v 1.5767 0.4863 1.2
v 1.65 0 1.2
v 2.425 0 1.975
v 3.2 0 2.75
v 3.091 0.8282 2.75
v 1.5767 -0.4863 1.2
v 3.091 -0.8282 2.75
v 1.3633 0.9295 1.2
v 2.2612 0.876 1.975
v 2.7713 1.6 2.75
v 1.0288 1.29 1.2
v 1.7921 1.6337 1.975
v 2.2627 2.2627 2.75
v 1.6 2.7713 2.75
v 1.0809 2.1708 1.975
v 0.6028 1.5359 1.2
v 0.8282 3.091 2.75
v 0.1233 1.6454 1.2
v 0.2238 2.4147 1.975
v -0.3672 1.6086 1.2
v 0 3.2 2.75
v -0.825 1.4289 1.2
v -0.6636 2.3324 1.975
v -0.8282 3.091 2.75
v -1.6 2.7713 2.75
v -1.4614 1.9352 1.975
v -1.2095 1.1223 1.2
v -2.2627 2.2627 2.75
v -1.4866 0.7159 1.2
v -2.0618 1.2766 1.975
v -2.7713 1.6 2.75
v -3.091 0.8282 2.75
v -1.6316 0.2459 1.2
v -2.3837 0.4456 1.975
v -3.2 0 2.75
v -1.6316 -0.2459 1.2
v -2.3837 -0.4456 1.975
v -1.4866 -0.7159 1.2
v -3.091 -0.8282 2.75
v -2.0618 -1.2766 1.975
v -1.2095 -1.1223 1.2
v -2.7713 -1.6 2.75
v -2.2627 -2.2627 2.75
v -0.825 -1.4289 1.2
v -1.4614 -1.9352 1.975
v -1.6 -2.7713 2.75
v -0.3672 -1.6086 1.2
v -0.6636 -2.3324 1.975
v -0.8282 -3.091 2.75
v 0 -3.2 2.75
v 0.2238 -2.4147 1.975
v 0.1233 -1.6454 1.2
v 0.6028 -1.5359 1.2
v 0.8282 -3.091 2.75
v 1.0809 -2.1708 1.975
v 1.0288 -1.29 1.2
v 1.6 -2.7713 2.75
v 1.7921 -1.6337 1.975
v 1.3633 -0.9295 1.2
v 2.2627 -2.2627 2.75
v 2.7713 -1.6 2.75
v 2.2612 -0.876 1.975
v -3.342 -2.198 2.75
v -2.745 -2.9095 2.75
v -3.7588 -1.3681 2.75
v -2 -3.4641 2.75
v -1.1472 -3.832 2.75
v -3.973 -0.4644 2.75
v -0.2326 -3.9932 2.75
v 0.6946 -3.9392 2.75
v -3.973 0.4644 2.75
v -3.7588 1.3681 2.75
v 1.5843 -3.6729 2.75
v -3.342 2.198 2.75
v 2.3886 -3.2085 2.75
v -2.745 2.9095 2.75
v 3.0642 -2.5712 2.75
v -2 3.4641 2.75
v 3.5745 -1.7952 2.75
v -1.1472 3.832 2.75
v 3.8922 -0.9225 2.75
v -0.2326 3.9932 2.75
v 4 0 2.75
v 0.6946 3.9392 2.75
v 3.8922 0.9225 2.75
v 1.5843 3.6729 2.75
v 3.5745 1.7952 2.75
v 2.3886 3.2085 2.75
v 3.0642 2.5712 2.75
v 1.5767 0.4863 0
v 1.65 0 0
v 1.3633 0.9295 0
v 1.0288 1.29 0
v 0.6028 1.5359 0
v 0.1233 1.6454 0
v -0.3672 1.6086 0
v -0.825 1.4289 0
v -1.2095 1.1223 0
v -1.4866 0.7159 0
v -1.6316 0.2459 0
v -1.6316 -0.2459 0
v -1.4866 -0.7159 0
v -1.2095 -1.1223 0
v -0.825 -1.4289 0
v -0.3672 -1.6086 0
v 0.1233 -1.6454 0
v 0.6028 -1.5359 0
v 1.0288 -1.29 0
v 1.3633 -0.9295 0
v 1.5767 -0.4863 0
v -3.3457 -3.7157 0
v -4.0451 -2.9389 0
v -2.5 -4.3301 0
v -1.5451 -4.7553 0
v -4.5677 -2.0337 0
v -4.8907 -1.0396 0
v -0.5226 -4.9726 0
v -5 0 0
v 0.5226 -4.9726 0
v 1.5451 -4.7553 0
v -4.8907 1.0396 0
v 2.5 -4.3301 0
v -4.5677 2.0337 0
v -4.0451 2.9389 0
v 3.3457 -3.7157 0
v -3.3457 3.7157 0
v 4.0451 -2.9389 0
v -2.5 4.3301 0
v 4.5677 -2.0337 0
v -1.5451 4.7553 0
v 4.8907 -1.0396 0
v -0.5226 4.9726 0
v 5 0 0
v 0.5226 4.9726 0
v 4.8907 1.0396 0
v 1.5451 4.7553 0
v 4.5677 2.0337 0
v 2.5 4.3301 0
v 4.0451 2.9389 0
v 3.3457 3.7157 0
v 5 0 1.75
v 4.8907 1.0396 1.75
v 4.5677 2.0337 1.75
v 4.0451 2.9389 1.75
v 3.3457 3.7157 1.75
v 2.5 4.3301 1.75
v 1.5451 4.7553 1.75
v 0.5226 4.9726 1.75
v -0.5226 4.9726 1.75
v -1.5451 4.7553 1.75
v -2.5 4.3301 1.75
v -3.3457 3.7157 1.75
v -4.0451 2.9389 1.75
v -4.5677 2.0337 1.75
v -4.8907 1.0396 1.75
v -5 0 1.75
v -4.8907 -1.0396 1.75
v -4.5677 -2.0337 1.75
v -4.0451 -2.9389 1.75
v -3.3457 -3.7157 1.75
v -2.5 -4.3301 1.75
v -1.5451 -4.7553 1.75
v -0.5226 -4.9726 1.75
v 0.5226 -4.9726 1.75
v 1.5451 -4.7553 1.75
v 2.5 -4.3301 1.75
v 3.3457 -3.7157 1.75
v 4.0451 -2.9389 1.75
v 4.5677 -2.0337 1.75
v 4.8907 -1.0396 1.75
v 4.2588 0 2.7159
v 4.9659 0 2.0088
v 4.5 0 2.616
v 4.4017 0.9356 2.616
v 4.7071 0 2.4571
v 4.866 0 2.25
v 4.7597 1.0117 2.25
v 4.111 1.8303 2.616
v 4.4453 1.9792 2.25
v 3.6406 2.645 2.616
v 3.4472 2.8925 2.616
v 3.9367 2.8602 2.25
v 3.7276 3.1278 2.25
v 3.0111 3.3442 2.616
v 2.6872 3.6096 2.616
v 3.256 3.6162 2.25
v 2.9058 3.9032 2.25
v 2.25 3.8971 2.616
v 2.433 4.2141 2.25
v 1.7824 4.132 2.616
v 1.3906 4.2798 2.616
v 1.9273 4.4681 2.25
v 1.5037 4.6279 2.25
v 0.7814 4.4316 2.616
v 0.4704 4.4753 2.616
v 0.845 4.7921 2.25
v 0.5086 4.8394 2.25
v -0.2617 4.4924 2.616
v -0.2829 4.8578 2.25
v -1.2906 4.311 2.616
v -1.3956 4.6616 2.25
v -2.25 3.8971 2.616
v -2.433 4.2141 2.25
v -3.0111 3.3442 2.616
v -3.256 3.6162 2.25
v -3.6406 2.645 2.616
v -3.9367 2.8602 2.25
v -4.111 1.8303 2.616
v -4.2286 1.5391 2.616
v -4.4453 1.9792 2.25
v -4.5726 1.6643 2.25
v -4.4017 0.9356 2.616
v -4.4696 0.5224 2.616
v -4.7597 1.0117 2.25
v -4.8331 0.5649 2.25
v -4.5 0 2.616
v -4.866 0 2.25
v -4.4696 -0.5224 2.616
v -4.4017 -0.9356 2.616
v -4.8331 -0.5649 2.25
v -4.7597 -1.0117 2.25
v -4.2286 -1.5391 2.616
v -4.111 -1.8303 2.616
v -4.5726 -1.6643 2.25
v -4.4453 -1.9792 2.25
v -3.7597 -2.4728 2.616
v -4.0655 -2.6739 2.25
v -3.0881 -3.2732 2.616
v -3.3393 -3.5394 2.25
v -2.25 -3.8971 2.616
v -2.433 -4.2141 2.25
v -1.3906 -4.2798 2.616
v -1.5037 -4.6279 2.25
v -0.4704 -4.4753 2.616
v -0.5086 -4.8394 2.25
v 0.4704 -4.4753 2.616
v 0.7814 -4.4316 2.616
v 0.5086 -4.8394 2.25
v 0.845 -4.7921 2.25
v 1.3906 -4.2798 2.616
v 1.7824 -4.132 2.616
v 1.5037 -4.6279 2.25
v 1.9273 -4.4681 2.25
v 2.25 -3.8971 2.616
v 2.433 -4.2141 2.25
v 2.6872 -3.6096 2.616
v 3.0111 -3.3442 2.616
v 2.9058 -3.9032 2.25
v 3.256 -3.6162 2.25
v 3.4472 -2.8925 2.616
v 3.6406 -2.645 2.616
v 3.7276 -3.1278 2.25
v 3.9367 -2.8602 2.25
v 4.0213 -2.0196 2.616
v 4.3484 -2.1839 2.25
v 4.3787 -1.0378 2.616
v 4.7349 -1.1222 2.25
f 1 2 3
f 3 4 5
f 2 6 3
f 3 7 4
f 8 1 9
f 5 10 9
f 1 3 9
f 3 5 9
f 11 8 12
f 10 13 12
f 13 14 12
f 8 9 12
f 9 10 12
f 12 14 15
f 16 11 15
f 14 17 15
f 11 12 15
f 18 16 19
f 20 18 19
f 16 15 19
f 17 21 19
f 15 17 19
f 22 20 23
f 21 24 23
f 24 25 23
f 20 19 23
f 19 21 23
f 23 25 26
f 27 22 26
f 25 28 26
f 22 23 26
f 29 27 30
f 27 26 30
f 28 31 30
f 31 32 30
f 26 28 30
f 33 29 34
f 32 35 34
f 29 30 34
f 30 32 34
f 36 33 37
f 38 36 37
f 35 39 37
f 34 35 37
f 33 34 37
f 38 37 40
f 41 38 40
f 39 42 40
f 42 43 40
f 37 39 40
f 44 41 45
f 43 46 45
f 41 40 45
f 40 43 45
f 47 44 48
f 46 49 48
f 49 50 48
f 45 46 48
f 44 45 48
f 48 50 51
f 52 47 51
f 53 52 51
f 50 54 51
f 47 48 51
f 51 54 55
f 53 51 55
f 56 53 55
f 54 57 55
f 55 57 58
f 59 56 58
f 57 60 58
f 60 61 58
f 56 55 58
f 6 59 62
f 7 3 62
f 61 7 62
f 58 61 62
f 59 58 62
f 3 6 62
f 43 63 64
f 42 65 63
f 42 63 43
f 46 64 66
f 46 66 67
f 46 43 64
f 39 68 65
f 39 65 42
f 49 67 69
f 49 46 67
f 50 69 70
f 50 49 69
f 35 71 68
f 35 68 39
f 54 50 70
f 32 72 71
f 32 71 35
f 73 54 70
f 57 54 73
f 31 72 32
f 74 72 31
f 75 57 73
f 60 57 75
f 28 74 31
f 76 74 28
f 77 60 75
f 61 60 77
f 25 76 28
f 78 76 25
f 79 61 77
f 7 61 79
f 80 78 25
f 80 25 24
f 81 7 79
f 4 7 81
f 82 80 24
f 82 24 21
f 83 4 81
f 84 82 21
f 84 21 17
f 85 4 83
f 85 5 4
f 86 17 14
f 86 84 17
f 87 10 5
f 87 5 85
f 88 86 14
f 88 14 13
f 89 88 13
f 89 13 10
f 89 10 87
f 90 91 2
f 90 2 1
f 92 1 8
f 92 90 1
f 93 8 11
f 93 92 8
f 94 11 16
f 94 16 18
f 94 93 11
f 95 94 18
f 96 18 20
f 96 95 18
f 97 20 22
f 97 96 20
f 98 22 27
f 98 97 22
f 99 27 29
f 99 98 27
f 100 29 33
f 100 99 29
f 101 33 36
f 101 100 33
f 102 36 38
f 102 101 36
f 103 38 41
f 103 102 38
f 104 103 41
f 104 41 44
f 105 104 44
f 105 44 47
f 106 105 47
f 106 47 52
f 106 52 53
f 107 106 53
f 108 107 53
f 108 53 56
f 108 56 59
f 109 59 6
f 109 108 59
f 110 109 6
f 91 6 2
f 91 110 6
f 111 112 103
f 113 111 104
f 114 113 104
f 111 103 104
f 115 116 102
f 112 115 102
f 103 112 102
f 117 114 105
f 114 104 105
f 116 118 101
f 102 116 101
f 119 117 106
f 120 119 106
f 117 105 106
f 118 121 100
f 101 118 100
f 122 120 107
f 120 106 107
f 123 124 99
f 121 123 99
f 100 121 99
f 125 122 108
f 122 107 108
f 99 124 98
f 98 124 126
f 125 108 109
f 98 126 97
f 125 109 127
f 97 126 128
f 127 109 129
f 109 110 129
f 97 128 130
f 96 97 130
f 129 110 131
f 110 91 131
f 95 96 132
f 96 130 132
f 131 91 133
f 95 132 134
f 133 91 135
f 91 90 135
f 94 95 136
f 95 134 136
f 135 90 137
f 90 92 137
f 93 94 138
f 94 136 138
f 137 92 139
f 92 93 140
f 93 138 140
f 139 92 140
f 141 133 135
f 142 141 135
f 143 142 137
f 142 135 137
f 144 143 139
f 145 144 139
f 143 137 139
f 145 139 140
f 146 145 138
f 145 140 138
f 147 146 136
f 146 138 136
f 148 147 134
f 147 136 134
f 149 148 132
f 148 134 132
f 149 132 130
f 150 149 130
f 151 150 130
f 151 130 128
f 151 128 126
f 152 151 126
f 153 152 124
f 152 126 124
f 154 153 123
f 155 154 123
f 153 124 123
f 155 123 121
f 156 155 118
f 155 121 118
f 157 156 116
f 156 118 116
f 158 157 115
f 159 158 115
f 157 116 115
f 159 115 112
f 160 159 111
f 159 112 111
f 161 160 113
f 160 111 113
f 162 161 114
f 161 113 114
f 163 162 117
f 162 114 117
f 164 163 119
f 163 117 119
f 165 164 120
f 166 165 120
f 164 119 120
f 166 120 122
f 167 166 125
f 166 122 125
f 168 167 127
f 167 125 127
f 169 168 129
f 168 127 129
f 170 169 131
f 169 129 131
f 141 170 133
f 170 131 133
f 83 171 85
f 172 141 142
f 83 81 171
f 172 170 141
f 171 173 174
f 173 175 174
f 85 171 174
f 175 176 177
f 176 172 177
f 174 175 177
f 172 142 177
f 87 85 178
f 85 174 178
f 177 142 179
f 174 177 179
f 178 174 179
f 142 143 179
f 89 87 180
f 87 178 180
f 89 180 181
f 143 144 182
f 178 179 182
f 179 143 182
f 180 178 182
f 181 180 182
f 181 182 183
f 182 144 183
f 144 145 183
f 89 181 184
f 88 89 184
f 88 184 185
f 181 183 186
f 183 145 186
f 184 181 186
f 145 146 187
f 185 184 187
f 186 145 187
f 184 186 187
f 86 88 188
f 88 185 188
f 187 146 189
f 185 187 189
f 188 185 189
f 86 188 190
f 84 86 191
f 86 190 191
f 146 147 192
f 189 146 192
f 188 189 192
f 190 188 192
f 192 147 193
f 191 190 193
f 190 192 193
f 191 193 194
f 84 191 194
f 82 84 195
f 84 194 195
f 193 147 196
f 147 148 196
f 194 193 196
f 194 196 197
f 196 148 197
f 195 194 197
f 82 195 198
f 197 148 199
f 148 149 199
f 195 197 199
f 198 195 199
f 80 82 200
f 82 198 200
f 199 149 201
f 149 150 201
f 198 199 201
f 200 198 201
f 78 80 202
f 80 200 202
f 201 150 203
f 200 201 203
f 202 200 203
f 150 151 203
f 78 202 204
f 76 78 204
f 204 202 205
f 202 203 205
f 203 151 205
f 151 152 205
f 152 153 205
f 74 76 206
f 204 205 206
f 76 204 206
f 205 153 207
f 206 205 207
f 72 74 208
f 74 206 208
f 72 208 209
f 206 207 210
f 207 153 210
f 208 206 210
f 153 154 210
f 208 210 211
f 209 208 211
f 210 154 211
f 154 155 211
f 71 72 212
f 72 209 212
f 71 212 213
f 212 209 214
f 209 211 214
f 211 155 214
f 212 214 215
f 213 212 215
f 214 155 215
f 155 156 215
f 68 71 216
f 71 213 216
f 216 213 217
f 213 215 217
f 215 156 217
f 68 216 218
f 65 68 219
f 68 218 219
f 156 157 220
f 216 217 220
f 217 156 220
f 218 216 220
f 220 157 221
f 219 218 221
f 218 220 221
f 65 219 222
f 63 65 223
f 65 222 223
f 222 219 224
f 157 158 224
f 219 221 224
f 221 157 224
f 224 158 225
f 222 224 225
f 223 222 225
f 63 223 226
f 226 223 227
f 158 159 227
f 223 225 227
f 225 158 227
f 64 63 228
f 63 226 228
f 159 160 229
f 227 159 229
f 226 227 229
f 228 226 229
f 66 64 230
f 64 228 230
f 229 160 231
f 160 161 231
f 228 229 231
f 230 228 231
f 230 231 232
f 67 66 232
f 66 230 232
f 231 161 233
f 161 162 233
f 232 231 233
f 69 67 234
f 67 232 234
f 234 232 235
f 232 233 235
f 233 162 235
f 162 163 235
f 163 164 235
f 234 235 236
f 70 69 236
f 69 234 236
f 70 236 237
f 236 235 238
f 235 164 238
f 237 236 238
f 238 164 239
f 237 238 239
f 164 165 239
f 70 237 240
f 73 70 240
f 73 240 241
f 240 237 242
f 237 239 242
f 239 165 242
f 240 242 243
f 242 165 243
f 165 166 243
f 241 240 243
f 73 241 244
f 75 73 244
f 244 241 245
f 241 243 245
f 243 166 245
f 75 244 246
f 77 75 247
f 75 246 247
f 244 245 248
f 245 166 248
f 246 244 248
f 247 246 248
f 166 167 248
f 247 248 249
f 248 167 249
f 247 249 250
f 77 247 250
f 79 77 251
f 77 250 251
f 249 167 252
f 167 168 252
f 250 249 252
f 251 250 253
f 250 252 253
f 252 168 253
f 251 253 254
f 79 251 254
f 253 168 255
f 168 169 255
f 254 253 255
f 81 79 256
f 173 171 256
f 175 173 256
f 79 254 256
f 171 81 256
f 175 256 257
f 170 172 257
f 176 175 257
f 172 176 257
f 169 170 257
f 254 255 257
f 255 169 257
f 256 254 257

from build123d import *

# Parameters (mm, degrees)
SKETCH1_R           = 5
SKETCH1_R_2         = 1.65
BOSS_EXTRUDE1_DEPTH = 2.75
CHAMFER2_SIZE       = 1.55
FILLET1_R           = 1


with BuildPart() as part:
    # Sketch1 → Boss-Extrude1 (new body)
    with BuildSketch(Plane(origin=(0, 0, 0), x_dir=(0, 1, 0), z_dir=(0, 0, 1))):
        with Locations(Location((0, 0, 0), (0, 0, 270))):
            Circle(SKETCH1_R)
        with Locations(Location((0, 0, 0), (0, 0, 270))):
            Circle(SKETCH1_R_2, mode=Mode.SUBTRACT)
    extrude(amount=BOSS_EXTRUDE1_DEPTH)

    # Chamfer2
    chamfer2_edges = [part.edges().sort_by_distance(p)[0] for p in [
        (-1.65, 0, 2.75),
    ]]
    chamfer(chamfer2_edges, length=CHAMFER2_SIZE)

    # Fillet1
    fillet1_edges = [part.edges().sort_by_distance(p)[0] for p in [
        (-5, 0, 2.75),
    ]]
    fillet(fillet1_edges, radius=FILLET1_R)


solid = part.part
